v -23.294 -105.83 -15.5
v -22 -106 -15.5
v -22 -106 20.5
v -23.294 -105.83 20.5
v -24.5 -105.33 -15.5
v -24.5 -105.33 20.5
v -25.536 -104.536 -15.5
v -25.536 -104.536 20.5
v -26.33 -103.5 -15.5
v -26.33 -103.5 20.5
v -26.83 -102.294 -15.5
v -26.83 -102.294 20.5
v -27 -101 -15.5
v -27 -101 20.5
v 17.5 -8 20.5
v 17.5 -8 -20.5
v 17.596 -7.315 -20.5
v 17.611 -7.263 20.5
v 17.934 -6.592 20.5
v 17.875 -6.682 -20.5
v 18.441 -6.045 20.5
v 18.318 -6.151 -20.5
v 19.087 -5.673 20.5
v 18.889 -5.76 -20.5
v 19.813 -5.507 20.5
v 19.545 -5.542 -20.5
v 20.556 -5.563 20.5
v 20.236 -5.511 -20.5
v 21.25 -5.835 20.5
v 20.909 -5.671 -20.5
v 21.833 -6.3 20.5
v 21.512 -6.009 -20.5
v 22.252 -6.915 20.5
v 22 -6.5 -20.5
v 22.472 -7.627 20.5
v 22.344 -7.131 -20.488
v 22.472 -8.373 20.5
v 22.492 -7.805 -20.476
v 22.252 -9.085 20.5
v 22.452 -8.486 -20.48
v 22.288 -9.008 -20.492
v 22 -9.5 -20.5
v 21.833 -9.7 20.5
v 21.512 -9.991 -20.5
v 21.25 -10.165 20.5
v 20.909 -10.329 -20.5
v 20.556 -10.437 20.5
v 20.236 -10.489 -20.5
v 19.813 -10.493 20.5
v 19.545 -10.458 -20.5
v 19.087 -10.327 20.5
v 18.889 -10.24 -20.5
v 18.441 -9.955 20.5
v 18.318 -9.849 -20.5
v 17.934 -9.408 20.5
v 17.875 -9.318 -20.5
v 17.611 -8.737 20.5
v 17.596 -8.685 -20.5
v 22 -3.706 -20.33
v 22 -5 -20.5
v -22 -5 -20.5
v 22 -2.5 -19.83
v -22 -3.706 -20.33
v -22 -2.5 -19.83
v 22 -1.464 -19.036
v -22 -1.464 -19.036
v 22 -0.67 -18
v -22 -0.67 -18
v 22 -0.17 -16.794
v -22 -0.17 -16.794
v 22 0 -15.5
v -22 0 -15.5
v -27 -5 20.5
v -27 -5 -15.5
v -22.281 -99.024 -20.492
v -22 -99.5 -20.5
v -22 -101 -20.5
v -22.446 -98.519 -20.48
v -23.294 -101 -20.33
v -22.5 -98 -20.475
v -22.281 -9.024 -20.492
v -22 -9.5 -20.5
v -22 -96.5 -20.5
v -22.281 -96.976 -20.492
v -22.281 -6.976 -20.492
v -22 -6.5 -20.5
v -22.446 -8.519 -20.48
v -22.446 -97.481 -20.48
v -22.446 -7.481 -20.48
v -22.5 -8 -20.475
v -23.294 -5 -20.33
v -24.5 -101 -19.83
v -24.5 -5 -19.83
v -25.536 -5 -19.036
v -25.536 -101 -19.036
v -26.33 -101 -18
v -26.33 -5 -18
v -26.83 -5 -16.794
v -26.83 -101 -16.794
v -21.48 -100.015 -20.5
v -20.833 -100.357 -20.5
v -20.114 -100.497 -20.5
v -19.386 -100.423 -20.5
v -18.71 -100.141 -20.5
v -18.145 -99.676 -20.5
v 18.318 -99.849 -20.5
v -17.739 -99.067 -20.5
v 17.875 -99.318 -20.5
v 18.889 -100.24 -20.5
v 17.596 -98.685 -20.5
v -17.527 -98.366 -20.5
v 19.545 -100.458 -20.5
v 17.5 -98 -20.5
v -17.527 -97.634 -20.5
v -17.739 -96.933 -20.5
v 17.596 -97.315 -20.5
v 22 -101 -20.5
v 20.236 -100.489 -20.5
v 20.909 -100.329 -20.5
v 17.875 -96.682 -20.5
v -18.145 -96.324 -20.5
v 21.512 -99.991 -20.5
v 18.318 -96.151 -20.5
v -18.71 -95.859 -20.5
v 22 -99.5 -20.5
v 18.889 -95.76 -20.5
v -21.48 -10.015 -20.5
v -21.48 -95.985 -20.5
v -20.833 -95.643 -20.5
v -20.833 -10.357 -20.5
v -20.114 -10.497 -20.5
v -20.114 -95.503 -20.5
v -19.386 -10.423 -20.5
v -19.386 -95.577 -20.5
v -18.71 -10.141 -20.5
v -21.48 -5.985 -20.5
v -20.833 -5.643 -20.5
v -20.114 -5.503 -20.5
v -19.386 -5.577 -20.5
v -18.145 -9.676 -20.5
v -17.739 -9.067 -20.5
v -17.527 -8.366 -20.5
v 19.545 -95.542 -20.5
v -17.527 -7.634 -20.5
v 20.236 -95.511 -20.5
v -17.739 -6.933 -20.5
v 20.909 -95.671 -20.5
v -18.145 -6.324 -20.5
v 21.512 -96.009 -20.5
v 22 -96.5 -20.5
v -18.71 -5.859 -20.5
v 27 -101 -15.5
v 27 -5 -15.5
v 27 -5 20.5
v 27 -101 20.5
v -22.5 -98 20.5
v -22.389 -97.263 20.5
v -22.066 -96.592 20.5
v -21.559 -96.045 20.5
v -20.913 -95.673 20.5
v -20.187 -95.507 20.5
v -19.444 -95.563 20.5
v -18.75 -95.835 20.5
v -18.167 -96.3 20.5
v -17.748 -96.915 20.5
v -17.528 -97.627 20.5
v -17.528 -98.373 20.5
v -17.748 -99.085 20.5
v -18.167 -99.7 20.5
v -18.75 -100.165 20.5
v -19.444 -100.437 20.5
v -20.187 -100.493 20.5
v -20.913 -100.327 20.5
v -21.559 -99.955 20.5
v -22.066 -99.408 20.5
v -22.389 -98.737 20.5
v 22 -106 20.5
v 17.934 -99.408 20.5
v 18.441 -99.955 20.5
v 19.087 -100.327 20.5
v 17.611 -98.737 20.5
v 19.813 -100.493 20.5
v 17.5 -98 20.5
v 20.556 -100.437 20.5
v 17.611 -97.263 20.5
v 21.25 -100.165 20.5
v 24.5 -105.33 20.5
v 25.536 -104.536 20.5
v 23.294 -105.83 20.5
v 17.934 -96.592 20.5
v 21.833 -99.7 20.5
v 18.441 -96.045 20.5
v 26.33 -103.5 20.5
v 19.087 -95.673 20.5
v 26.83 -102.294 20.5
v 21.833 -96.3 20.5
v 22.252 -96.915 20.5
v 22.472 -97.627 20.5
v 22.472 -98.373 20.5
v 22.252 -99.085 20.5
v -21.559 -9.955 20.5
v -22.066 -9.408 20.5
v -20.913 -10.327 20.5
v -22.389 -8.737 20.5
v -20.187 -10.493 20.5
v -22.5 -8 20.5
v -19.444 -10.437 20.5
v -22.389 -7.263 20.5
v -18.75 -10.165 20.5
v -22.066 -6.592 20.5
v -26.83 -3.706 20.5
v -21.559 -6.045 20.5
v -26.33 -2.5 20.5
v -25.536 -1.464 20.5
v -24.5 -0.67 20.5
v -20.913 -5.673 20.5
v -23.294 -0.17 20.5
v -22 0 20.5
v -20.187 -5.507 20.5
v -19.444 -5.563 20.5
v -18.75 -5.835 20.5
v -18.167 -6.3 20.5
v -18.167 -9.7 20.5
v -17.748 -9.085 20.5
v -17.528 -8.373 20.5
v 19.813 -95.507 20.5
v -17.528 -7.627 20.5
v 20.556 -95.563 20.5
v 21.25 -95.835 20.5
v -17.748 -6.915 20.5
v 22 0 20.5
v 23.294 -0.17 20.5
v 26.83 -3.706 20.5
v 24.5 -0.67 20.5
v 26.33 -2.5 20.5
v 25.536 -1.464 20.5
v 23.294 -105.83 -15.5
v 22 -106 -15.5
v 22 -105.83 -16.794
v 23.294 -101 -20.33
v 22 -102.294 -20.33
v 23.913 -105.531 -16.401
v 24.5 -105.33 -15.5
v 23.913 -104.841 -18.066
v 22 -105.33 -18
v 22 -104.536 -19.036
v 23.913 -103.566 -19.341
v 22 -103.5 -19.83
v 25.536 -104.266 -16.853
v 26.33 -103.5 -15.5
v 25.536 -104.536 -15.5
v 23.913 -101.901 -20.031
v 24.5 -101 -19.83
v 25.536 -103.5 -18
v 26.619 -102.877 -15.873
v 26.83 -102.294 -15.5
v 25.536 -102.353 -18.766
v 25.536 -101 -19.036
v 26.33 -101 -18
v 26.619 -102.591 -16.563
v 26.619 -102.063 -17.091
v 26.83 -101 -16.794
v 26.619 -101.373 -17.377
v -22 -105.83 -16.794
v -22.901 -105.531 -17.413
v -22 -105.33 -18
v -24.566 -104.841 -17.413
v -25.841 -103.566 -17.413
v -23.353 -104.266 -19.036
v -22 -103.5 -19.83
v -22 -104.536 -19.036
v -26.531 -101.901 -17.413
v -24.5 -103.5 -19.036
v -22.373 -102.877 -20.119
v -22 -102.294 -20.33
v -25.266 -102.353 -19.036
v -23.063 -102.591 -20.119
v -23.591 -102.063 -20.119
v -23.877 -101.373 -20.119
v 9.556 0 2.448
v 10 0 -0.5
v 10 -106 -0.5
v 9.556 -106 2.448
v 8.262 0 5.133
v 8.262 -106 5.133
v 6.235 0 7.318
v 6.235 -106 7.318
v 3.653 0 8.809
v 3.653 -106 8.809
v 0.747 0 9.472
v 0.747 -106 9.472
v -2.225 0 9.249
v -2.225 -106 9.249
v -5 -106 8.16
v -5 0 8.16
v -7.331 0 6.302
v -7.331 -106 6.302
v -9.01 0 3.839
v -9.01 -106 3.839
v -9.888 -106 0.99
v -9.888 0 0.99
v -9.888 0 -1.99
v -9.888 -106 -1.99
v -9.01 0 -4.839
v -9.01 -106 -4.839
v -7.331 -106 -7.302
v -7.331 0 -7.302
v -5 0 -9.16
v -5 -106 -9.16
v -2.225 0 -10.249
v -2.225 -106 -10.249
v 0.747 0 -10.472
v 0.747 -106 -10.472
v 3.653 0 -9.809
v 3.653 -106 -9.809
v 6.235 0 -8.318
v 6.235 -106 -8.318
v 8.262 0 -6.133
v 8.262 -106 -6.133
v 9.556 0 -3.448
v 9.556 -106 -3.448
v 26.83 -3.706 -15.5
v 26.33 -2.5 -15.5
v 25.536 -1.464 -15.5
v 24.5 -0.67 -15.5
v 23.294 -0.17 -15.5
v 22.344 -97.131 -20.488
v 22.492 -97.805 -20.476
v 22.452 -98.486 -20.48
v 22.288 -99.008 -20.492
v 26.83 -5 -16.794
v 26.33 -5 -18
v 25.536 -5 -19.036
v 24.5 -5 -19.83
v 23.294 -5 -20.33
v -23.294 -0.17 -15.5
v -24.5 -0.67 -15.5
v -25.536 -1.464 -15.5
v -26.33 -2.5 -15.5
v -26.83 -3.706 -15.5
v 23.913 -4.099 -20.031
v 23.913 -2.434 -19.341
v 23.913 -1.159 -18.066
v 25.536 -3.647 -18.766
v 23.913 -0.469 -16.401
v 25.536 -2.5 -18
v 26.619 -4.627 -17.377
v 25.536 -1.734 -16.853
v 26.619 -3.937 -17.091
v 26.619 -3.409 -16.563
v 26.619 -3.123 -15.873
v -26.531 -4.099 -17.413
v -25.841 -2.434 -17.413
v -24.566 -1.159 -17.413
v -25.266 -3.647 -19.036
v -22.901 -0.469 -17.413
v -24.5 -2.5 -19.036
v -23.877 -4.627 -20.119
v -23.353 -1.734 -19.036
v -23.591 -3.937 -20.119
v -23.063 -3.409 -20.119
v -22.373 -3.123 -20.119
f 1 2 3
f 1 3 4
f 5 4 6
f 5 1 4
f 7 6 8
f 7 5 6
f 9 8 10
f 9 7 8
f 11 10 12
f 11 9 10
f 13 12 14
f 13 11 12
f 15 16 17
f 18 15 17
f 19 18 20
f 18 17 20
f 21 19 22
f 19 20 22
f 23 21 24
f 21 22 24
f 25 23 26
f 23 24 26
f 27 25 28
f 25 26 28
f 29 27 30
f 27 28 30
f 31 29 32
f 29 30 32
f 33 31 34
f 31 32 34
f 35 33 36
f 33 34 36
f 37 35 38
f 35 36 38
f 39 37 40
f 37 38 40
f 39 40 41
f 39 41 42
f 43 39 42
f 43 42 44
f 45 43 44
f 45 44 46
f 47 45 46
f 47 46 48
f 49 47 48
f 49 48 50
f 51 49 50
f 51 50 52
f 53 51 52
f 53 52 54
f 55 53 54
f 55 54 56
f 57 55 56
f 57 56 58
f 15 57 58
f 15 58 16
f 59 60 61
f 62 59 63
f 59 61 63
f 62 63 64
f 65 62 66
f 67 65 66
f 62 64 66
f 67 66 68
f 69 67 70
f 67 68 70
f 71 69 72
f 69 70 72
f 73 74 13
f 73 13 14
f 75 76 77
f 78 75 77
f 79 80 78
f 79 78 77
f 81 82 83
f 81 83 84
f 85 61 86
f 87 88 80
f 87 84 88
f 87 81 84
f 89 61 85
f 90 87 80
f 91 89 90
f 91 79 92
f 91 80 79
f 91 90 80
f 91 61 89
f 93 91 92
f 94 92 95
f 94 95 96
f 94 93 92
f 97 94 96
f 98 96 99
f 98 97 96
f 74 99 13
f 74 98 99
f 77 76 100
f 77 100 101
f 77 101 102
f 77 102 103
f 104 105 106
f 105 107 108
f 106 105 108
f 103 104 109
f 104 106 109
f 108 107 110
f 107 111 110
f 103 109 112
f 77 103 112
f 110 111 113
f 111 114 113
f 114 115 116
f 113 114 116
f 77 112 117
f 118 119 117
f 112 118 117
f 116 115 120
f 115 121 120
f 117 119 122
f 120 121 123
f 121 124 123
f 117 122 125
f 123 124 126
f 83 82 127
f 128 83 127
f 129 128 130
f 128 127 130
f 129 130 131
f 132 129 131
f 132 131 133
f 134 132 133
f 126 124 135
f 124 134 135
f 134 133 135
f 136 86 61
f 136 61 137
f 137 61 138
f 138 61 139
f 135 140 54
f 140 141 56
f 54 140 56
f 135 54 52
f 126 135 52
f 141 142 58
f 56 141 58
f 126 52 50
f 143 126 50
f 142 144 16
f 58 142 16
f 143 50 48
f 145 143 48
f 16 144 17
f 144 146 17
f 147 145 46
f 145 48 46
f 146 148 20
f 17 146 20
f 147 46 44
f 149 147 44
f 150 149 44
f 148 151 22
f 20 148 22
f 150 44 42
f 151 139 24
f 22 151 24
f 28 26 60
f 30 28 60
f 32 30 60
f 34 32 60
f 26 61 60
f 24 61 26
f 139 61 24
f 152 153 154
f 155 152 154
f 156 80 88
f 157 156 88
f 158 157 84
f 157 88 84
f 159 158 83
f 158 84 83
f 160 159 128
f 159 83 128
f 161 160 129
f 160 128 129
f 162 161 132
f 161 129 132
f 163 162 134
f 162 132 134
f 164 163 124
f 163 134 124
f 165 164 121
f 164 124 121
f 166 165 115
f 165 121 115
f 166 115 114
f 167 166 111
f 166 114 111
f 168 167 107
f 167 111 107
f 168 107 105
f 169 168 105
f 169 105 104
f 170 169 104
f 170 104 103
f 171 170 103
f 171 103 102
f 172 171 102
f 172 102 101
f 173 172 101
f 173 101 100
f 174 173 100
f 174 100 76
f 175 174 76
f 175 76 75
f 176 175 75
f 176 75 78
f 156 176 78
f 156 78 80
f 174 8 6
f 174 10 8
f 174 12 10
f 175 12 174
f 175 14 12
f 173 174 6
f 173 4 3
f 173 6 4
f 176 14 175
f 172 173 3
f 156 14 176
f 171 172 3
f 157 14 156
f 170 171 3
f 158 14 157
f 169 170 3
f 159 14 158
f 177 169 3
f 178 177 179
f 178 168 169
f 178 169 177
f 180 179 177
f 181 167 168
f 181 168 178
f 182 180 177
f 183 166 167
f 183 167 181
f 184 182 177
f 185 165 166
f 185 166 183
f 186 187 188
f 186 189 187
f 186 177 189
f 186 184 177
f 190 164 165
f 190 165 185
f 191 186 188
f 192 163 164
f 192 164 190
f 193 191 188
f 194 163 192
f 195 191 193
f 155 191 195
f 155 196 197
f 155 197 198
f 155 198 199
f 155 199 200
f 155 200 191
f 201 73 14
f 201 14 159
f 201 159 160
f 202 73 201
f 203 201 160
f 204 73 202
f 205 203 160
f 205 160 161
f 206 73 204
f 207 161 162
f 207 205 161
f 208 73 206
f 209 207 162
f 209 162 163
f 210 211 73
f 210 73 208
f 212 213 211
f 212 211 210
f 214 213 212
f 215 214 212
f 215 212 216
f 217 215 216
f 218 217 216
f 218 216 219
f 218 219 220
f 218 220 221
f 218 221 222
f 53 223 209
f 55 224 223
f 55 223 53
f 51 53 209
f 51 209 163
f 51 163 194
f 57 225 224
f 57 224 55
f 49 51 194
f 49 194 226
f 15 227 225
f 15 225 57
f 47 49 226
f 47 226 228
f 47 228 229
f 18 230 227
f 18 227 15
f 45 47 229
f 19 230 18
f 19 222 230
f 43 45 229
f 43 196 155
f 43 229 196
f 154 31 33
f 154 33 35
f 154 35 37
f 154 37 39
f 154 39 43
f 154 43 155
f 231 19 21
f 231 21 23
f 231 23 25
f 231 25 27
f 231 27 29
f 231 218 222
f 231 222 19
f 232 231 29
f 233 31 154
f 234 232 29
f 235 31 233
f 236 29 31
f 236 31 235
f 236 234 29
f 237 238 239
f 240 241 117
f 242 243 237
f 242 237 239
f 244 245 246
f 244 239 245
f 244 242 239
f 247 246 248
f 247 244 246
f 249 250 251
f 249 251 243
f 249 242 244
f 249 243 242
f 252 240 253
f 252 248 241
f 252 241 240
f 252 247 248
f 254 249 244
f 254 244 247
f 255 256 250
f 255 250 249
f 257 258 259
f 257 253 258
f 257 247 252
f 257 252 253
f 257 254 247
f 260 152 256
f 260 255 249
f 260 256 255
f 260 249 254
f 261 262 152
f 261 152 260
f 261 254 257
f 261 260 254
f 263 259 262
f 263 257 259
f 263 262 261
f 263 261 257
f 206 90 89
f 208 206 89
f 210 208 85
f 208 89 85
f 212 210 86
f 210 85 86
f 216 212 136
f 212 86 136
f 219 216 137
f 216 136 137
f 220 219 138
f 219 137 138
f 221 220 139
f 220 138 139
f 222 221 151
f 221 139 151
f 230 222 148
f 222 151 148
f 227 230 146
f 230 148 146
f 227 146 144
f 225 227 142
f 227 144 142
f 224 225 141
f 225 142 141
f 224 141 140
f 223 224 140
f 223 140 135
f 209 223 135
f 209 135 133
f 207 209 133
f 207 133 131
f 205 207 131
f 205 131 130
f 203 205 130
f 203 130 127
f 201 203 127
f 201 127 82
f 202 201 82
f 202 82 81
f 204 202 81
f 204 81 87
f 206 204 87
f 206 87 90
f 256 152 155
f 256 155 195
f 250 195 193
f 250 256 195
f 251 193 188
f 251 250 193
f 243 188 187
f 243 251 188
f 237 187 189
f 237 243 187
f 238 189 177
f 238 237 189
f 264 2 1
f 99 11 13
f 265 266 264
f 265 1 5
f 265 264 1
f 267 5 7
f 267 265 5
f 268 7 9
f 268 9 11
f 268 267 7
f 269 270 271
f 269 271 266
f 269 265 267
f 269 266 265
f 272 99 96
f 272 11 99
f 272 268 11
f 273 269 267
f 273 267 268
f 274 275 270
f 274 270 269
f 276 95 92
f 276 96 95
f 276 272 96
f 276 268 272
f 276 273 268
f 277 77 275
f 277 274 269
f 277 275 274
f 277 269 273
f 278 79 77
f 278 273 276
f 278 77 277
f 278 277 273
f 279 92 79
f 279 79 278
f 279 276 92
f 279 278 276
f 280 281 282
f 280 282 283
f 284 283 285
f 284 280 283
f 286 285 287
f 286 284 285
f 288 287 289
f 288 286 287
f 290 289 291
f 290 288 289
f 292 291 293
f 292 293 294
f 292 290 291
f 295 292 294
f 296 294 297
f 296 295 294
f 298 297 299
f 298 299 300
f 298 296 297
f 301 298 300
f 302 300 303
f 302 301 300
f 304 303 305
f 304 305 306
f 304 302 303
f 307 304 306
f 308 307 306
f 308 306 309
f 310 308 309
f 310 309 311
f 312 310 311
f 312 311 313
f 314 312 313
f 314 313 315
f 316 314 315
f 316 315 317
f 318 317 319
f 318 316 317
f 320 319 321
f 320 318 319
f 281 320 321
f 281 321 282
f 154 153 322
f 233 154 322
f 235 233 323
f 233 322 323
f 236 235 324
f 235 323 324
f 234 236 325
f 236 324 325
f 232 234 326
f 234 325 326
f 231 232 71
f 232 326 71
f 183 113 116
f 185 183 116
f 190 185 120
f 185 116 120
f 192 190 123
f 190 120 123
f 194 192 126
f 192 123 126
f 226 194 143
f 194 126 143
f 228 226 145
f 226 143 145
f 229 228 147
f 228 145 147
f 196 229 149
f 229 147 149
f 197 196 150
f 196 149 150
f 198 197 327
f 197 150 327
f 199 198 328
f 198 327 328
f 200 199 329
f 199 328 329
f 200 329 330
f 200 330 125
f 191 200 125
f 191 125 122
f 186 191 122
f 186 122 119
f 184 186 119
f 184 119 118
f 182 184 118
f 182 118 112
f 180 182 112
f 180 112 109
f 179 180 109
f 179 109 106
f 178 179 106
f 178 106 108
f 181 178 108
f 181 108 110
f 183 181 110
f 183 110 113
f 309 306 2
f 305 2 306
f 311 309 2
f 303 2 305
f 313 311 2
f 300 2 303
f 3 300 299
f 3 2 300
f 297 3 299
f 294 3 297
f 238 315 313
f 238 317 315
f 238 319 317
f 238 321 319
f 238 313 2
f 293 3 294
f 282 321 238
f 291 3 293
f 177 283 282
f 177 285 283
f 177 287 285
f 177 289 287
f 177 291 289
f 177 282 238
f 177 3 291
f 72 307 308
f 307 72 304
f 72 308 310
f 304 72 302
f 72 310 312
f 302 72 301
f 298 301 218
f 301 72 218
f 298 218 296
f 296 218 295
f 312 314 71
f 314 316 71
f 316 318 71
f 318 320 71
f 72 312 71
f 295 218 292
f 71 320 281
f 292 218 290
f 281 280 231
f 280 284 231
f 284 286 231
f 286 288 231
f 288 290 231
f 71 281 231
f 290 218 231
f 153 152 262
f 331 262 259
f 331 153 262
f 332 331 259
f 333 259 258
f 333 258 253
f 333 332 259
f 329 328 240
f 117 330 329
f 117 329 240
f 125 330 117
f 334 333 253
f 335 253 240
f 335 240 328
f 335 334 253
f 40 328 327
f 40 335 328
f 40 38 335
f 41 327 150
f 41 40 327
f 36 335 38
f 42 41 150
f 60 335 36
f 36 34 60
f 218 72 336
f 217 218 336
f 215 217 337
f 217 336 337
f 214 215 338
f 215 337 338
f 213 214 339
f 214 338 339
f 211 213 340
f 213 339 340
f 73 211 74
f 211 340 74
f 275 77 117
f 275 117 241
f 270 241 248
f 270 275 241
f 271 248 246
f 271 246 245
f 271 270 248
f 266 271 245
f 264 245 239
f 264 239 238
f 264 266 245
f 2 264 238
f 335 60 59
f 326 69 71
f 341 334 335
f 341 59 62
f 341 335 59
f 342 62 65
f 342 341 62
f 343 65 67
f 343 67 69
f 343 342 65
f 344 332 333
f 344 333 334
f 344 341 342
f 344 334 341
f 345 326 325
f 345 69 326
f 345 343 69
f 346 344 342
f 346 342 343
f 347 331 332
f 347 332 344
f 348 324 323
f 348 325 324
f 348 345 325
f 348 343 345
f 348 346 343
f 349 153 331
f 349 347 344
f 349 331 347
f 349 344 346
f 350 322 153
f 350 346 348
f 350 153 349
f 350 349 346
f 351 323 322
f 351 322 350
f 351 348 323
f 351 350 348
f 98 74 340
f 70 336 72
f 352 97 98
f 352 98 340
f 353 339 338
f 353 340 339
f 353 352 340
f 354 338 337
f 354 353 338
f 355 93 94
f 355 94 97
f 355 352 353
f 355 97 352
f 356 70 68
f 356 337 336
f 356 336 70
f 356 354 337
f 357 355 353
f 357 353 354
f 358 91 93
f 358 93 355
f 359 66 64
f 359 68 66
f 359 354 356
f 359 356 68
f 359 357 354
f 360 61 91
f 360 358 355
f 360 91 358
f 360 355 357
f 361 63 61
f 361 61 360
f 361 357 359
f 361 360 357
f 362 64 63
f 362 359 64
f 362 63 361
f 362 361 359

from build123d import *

# Parameters (mm, degrees)
F0_W         = 54
F0_H         = 41
F0_R         = 10
F1_DEPTH     = 106
F3_D         = 5
F4_T1_DEPTH  = 48.5
F4_T3_DEPTH  = 44
F4_T5_DEPTH  = 96
F4_S9_W      = 5
F4_S9_H      = 5
F4_T10_DEPTH = 5
F4_S15_W     = 5
F4_S15_H     = 5
F4_T16_DEPTH = 5
F4_S21_W     = 5
F4_S21_H     = 5
F4_T22_DEPTH = 5
F4_S27_W     = 5
F4_S27_H     = 5
F4_T28_DEPTH = 5


# Not quite as in the source:
# - a fillet or chamfer that OpenCascade refuses, or shapes differently, is made with other operations: its cross-section is extruded or revolved along the edge and cut away or added


with BuildPart() as f1:
    # F0 (on Front) → F1 (new body)
    with BuildSketch(Plane.XZ):
        Rectangle(F0_W, F0_H)
        with Locations((0, -0.5)):
            Circle(F0_R, mode=Mode.SUBTRACT)
    extrude(amount=F1_DEPTH)

    # F3 (through all)
    with Locations(Plane.XY.offset(20.5)):
        with Locations((-20, -8), (20, -8), (-20, -98), (20, -98)):
            Hole(F3_D / 2)

    # F4: fillet of radius 5 on 8 edges, made by hand

    # F4_s2 → F4_t1 (cut)
    with BuildSketch(Plane.XY.offset(-15.5)):
        with BuildLine():
            ThreePointArc((-22, -106), (-25.5355339059, -104.5355339059), (-27, -101))
            Line((-27, -101), (-27, -106))
            Line((-27, -106), (-22, -106))
        make_face()
        with BuildLine():
            ThreePointArc((27, -101), (25.5355339059, -104.5355339059), (22, -106))
            Line((22, -106), (27, -106))
            Line((27, -106), (27, -101))
        make_face()
        with BuildLine():
            ThreePointArc((27, -5), (25.5355339059, -1.4644660941), (22, 0))
            Line((22, 0), (27, 0))
            Line((27, 0), (27, -5))
        make_face()
        with BuildLine():
            ThreePointArc((-22, 0), (-25.5355339059, -1.4644660941), (-27, -5))
            Line((-27, -5), (-27, 0))
            Line((-27, 0), (-22, 0))
        make_face()
    extrude(amount=F4_T1_DEPTH, mode=Mode.SUBTRACT)

    # F4_s4 → F4_t3 (cut)
    with BuildSketch(Plane.YZ.offset(-22)):
        with BuildLine():
            ThreePointArc((-101, -20.5), (-104.5355339059, -19.0355339059), (-106, -15.5))
            Line((-106, -15.5), (-106, -20.5))
            Line((-106, -20.5), (-101, -20.5))
        make_face()
        with BuildLine():
            ThreePointArc((-5, -20.5), (-1.4644660941, -19.0355339059), (0, -15.5))
            Line((0, -15.5), (0, -20.5))
            Line((0, -20.5), (-5, -20.5))
        make_face()
    extrude(amount=F4_T3_DEPTH, mode=Mode.SUBTRACT)

    # F4_s6 → F4_t5 (cut)
    with BuildSketch(Plane.XZ.offset(5)):
        with BuildLine():
            ThreePointArc((27, -15.5), (25.5355339059, -19.0355339059), (22, -20.5))
            Line((22, -20.5), (27, -20.5))
            Line((27, -20.5), (27, -15.5))
        make_face()
        with BuildLine():
            ThreePointArc((-22, -20.5), (-25.5355339059, -19.0355339059), (-27, -15.5))
            Line((-27, -15.5), (-27, -20.5))
            Line((-27, -20.5), (-22, -20.5))
        make_face()
    extrude(amount=F4_T5_DEPTH, mode=Mode.SUBTRACT)


with BuildPart() as f4_tool8:
    # F4_s9 → F4_t10 (new body)
    with BuildSketch(Plane.XY.offset(-15.5)):
        with Locations((-24.5, -103.5)):
            Rectangle(F4_S9_W, F4_S9_H)
    extrude(amount=-F4_T10_DEPTH)

    # F4_s11 → F4_t12 (revolve, cut)
    with BuildSketch(Plane(origin=(-22, -101, -15.5), x_dir=(0.7071067812, 0.7071067812, 0), z_dir=(-0.7071067812, 0.7071067812, 0))):
        with BuildLine():
            ThreePointArc((0, -5), (5, 0), (0, 5))
            Line((0, 5), (0, -5))
        make_face()
    revolve(axis=Axis((-22, -101, -15.5), (0, 0, -1)), mode=Mode.SUBTRACT)


with BuildPart() as f1_1:
    add(f1.part)

    # F4_t7: cut F4_tool8
    add(f4_tool8.part, mode=Mode.SUBTRACT)


with BuildPart() as f4_tool14:
    # F4_s15 → F4_t16 (new body)
    with BuildSketch(Plane.YZ.offset(22)):
        with Locations((-103.5, -18)):
            Rectangle(F4_S15_W, F4_S15_H)
    extrude(amount=F4_T16_DEPTH)

    # F4_s17 → F4_t18 (revolve, cut)
    with BuildSketch(Plane(origin=(22, -101, -15.5), x_dir=(0, 0.7071067812, 0.7071067812), z_dir=(0, 0.7071067812, -0.7071067812))):
        with BuildLine():
            ThreePointArc((0, -5), (5, 0), (0, 5))
            Line((0, 5), (0, -5))
        make_face()
    revolve(axis=Axis((22, -101, -15.5), (1, 0, 0)), mode=Mode.SUBTRACT)


with BuildPart() as f1_2:
    add(f1_1.part)

    # F4_t13: cut F4_tool14
    add(f4_tool14.part, mode=Mode.SUBTRACT)


with BuildPart() as f4_tool20:
    # F4_s21 → F4_t22 (new body)
    with BuildSketch(Plane.YZ.offset(22)):
        with Locations((-2.5, -18)):
            Rectangle(F4_S21_W, F4_S21_H)
    extrude(amount=F4_T22_DEPTH)

    # F4_s23 → F4_t24 (revolve, cut)
    with BuildSketch(Plane(origin=(22, -5, -15.5), x_dir=(0, -0.7071067812, 0.7071067812), z_dir=(0, 0.7071067812, 0.7071067812))):
        with BuildLine():
            ThreePointArc((0, -5), (5, 0), (0, 5))
            Line((0, 5), (0, -5))
        make_face()
    revolve(axis=Axis((22, -5, -15.5), (1, 0, 0)), mode=Mode.SUBTRACT)


with BuildPart() as f1_3:
    add(f1_2.part)

    # F4_t19: cut F4_tool20
    add(f4_tool20.part, mode=Mode.SUBTRACT)


with BuildPart() as f4_tool26:
    # F4_s27 → F4_t28 (new body)
    with BuildSketch(Plane.XY.offset(-15.5)):
        with Locations((-24.5, -2.5)):
            Rectangle(F4_S27_W, F4_S27_H)
    extrude(amount=-F4_T28_DEPTH)

    # F4_s29 → F4_t30 (revolve, cut)
    with BuildSketch(Plane(origin=(-22, -5, -15.5), x_dir=(0.7071067812, -0.7071067812, 0), z_dir=(0.7071067812, 0.7071067812, 0))):
        with BuildLine():
            ThreePointArc((0, -5), (5, 0), (0, 5))
            Line((0, 5), (0, -5))
        make_face()
    revolve(axis=Axis((-22, -5, -15.5), (0, 0, -1)), mode=Mode.SUBTRACT)


with BuildPart() as f1_4:
    add(f1_3.part)

    # F4_t25: cut F4_tool26
    add(f4_tool26.part, mode=Mode.SUBTRACT)


solid = f1_4.part
